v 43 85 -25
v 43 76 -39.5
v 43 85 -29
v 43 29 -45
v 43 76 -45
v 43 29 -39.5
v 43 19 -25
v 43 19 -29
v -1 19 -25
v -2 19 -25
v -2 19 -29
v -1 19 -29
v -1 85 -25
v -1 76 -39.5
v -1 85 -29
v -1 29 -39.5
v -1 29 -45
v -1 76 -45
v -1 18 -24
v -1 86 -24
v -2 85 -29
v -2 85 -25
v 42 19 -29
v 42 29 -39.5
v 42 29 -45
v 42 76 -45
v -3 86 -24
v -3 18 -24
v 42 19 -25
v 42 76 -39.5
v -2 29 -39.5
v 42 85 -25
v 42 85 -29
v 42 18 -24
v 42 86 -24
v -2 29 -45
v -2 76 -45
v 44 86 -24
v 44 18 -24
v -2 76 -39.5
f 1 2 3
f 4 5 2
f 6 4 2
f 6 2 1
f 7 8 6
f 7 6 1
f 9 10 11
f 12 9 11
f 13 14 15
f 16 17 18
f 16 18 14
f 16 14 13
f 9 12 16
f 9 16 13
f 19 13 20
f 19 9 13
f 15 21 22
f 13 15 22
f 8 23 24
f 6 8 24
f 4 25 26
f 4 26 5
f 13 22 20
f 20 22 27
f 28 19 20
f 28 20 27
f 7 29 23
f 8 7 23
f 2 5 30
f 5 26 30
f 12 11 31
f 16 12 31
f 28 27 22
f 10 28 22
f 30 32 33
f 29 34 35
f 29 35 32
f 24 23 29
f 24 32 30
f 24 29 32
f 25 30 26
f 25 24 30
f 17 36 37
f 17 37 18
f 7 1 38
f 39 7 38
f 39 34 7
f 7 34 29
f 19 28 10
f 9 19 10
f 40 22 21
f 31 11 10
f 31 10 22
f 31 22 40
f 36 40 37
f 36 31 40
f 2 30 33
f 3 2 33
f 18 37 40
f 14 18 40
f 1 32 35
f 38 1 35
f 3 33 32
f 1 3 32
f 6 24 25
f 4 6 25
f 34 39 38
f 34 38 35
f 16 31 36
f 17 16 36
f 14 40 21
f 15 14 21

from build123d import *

# Parameters (mm, degrees)
EXTRUDE090_DEPTH = 50
EXTRUDE087_DEPTH = 68


with BuildPart() as extrude090:
    # Sketch099 → Extrude090 (new body)
    with BuildSketch(Plane.YZ.offset(-4)):
        Polygon((17, -23), (19, -25), (19, -29), (29, -39.5), (29, -46), (17, -46), align=None)
        Polygon((76, -46), (76, -39.5), (85, -29), (85, -25), (87, -23), (87, -46), align=None)
    extrude(amount=EXTRUDE090_DEPTH)


with BuildPart() as cut014:
    # Sketch096 → Extrude087 (new body)
    with BuildSketch(Plane.XZ.offset(-18)):
        Polygon((-1, -45), (-1, -24), (-3, -24), (-2, -25), (-2, -45), align=None)
        Polygon((42, -24), (42, -45), (43, -45), (43, -25), (44, -24), align=None)
    extrude(amount=-EXTRUDE087_DEPTH)

    # Cut014: cut Extrude090
    add(extrude090.part, mode=Mode.SUBTRACT)


solid = cut014.part
